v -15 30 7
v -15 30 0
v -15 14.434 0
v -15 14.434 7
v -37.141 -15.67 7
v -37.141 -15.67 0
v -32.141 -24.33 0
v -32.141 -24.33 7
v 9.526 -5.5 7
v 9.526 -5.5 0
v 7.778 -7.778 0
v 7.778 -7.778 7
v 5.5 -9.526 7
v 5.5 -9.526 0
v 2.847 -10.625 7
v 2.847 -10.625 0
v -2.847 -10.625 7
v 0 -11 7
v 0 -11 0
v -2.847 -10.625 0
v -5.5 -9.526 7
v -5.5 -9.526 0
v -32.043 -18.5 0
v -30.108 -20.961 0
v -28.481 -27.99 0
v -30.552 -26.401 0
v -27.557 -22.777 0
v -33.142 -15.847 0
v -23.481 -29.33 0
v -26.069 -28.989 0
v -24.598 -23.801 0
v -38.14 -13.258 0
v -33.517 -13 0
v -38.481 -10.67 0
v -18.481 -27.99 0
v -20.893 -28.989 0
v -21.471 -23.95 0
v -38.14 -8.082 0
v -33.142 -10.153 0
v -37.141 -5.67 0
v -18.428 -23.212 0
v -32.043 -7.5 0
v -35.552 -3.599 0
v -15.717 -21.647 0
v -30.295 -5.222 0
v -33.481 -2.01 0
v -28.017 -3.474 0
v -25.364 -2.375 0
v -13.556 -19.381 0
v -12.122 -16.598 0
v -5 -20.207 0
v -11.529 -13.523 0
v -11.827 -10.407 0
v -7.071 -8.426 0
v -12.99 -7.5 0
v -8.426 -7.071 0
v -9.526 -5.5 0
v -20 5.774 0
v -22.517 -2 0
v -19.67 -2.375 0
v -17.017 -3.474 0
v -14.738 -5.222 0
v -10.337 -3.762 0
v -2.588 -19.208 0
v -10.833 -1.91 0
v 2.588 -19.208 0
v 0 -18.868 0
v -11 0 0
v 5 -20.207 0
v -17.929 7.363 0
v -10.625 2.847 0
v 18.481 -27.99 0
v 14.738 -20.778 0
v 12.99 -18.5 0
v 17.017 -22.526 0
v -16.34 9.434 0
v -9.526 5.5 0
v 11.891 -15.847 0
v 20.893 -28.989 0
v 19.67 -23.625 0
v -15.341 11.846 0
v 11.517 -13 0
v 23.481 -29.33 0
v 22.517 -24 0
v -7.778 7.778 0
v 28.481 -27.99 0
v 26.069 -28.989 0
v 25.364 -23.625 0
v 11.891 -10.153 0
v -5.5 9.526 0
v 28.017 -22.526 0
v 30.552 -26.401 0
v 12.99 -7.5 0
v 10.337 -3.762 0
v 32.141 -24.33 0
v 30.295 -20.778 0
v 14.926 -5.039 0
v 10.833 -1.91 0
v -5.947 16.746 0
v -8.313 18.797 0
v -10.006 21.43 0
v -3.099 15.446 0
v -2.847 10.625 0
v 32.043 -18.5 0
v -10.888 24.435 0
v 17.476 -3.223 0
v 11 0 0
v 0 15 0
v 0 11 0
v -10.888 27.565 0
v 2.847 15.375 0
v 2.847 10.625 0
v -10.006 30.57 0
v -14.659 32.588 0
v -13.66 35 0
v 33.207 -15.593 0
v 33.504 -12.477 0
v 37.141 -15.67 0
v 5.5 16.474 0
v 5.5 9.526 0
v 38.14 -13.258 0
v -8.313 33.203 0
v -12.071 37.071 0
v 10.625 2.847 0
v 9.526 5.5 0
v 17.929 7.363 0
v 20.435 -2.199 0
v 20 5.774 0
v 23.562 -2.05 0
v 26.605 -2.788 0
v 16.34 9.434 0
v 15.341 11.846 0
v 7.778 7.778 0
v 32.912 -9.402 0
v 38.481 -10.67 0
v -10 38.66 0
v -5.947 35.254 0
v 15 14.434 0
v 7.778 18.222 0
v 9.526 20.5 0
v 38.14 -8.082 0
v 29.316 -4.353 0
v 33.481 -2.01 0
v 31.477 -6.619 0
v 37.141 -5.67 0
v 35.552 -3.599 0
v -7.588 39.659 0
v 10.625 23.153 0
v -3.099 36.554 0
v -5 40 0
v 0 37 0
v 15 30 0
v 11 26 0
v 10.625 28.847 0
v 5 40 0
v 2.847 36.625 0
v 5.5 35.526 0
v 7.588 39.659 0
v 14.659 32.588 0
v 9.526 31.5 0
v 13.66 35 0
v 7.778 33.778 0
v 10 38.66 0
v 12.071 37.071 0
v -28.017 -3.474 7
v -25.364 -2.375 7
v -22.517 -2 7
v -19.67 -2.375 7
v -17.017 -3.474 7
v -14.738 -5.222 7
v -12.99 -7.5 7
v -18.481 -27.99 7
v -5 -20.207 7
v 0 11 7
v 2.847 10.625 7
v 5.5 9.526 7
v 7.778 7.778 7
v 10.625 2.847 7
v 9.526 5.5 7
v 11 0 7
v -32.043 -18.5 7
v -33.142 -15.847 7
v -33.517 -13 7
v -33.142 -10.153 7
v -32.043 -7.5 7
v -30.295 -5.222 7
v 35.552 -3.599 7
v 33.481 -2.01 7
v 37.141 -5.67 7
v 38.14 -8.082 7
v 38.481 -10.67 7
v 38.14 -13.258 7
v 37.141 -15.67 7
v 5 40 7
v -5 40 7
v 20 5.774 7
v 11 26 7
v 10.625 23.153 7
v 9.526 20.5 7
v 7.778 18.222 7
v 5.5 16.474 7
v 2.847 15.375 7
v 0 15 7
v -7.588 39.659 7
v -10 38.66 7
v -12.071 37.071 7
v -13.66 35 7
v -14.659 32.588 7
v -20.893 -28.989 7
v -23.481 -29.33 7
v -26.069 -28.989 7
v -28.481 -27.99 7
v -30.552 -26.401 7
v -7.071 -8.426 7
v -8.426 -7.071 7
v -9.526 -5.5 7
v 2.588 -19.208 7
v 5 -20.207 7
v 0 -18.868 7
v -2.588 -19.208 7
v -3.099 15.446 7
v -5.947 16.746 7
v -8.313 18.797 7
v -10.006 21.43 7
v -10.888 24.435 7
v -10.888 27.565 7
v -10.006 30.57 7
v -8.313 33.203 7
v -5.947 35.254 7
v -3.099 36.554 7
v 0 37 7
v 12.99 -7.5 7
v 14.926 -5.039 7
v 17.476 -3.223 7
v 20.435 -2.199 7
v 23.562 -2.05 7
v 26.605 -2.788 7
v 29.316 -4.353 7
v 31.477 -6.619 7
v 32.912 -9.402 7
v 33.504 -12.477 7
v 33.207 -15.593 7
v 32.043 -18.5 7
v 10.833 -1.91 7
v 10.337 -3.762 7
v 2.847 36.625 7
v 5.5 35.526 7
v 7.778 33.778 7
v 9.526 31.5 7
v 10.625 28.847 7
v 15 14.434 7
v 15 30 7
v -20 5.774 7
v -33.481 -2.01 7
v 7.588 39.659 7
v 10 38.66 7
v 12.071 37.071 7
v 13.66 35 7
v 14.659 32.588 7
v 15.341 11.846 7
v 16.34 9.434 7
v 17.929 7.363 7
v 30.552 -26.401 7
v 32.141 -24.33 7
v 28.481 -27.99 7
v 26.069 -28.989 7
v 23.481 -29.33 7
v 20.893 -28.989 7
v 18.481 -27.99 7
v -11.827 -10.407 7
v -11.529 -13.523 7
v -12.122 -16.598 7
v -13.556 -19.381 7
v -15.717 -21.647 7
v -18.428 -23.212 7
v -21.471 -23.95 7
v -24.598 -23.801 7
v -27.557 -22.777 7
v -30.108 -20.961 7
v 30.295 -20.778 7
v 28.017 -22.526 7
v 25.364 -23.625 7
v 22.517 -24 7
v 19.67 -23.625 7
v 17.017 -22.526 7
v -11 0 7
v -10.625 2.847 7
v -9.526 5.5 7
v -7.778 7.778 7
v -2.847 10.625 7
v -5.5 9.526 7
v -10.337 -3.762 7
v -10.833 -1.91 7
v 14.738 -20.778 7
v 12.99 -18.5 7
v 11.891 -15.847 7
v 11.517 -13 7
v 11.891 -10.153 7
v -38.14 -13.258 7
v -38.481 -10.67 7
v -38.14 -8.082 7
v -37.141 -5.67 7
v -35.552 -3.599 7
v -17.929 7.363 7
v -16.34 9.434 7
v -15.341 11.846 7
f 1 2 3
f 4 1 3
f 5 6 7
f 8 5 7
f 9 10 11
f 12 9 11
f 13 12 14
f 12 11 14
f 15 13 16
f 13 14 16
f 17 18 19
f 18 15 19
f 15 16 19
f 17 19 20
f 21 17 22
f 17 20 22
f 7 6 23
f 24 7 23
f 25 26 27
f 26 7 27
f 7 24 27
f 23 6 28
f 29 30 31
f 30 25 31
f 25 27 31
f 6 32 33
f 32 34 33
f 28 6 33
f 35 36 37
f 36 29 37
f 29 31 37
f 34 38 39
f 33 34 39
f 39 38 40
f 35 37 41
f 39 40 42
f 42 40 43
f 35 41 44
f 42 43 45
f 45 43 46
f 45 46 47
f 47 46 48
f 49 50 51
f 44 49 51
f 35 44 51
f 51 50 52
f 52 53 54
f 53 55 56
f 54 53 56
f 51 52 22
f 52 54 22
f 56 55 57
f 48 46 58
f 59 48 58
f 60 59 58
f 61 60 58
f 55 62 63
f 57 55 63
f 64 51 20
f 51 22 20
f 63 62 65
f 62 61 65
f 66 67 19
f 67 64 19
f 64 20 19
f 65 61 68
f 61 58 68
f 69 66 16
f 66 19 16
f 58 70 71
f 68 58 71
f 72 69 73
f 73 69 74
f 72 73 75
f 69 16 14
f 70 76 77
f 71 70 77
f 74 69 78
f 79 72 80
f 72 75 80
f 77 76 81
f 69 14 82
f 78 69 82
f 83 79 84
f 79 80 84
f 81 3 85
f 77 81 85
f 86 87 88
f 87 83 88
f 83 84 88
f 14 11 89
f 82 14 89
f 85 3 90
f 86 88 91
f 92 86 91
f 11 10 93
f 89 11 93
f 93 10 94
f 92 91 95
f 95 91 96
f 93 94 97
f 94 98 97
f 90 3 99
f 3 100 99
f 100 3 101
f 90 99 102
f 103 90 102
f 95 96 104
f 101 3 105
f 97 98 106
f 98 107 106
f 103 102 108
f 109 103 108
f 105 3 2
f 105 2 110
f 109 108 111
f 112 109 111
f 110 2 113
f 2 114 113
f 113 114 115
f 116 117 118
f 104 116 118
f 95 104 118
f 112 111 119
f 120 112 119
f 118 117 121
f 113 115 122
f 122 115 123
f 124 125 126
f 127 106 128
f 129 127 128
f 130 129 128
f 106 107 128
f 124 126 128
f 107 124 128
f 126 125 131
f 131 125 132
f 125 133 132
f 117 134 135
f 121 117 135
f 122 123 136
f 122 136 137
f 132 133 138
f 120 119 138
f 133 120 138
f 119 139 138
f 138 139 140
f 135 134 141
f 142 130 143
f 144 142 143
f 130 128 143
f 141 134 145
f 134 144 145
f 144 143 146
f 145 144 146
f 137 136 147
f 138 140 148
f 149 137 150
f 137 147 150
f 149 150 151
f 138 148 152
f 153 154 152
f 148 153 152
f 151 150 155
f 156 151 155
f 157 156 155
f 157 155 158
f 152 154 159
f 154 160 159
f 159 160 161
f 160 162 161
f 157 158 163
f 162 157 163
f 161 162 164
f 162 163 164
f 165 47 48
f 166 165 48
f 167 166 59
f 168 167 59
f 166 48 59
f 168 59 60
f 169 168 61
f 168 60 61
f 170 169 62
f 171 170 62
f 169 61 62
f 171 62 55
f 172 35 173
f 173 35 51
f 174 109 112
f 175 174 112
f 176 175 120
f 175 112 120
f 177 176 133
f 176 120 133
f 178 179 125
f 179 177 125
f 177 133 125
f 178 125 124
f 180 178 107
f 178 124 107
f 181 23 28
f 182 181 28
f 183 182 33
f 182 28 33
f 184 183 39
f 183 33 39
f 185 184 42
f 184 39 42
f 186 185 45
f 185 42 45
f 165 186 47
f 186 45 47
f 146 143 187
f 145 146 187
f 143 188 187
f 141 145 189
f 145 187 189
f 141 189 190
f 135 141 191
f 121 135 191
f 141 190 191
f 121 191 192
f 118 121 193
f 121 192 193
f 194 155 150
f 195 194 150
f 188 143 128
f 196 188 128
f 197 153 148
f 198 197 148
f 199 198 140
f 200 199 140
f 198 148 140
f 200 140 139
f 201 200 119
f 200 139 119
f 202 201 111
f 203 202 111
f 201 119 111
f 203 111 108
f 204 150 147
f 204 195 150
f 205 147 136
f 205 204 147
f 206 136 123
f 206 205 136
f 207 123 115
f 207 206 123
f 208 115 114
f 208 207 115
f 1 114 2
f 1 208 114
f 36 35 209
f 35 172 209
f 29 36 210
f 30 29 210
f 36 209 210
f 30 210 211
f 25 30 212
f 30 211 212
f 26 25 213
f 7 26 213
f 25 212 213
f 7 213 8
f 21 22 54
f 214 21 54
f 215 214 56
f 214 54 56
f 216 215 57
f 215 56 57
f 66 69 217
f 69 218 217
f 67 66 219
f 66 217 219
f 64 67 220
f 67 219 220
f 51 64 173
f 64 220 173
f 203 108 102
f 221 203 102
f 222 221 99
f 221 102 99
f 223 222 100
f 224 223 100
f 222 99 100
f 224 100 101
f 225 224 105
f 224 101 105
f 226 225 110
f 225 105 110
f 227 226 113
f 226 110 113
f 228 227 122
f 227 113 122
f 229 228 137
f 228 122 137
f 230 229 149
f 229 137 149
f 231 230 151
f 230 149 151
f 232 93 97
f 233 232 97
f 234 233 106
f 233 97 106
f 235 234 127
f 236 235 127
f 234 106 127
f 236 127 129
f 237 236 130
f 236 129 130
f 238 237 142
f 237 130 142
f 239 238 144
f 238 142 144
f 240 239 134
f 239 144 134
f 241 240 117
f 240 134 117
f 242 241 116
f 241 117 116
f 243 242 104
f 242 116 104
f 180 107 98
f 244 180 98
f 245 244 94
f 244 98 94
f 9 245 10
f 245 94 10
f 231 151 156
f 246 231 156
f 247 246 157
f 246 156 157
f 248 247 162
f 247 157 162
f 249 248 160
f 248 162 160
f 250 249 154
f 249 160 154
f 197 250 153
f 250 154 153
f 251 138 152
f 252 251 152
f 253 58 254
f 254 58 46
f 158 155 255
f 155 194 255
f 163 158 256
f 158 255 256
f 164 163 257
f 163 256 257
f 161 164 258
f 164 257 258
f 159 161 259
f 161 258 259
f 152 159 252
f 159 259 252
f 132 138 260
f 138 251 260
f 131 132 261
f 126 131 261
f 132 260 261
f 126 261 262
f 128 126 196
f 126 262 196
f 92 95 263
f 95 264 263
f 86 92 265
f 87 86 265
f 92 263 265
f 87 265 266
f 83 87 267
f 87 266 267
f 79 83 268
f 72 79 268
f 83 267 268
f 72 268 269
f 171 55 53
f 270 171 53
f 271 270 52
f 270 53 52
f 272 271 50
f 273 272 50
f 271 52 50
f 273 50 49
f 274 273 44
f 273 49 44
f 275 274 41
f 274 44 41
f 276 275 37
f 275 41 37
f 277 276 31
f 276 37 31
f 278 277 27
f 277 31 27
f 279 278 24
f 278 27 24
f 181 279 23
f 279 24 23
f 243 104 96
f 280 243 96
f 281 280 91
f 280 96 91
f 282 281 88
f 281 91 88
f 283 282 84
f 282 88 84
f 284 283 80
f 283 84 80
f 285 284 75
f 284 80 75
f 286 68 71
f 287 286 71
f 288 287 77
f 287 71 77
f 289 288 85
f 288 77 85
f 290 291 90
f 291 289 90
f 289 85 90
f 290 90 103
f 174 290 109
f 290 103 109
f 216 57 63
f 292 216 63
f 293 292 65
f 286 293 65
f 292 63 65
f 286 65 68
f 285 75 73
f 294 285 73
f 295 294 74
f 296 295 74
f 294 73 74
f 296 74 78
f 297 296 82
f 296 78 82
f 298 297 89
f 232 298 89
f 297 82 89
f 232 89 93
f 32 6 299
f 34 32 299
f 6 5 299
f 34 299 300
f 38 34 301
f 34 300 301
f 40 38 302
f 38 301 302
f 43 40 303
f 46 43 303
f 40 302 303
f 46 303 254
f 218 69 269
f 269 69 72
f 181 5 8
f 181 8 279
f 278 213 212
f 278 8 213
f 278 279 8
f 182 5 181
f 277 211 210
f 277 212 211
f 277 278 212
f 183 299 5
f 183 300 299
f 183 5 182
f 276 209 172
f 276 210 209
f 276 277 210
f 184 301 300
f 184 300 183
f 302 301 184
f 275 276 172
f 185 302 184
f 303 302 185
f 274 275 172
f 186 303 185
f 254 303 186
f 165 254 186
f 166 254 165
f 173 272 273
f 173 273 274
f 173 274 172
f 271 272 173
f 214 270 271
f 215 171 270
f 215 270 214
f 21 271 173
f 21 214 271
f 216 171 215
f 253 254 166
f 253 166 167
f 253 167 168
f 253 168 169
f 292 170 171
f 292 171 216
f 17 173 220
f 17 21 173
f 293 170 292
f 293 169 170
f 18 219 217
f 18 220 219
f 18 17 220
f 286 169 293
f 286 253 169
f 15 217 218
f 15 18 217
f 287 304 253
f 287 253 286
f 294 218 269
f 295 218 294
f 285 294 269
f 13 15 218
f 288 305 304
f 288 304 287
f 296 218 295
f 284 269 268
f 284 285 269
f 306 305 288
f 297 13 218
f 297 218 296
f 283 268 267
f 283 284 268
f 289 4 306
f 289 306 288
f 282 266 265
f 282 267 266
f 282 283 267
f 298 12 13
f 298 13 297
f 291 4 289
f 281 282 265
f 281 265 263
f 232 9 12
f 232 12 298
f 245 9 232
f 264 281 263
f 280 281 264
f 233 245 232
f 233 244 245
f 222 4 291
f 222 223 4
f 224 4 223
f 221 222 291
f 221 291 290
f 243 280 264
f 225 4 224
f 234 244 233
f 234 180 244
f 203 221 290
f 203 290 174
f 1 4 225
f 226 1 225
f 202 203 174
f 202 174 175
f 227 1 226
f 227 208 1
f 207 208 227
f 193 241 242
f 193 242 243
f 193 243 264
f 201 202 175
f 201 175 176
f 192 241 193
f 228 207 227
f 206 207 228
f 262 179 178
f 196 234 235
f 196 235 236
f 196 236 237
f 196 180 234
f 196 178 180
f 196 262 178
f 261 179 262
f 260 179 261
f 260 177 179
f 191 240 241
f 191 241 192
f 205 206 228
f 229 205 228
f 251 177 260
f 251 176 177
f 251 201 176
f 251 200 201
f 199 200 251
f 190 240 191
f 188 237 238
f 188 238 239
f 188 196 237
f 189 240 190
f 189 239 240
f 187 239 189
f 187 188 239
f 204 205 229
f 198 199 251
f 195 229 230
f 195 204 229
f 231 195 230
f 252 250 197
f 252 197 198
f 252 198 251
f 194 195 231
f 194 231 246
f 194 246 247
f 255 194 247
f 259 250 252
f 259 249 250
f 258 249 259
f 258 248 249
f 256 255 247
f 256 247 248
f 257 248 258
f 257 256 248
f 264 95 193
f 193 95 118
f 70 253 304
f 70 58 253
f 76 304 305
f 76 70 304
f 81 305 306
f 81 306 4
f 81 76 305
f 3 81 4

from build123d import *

# Parameters (mm, degrees)
F1_DEPTH = 7
F3_ANGLE = 120
F4_ANGLE = 240
F6_R     = 10


with BuildPart() as f1:
    # F0 (on Top) → F1 (new body)
    with BuildSketch(Plane.XY):
        with BuildLine():
            ThreePointArc((-11, 0), (-7.7781745931, 7.7781745931), (0, 11))
            Line((0, 11), (0, 15))
            ThreePointArc((0, 15), (-11, 26), (0, 37))
            Line((0, 37), (0, 40))
            Line((0, 40), (-15, 40))
            Line((-15, 40), (-15, 0))
            Line((-15, 0), (-11, 0))
        make_face()
        with BuildLine():
            ThreePointArc((0, 11), (7.7781745931, 7.7781745931), (11, 0))
            Line((11, 0), (15, 0))
            Line((15, 0), (15, 40))
            Line((15, 40), (0, 40))
            Line((0, 40), (0, 37))
            ThreePointArc((0, 37), (7.7781745931, 33.7781745931), (11, 26))
            ThreePointArc((11, 26), (7.7781745931, 18.2218254069), (0, 15))
            Line((0, 15), (0, 11))
        make_face()
    extrude(amount=F1_DEPTH)


with BuildPart() as f3_1:
    # F3: copy of F1
    add(f1.part.rotate(Axis((0, 0, 26.0697361082), (0, 0, 1)), F3_ANGLE))


with BuildPart() as f4_1:
    # F4: copy of F1
    add(f1.part.rotate(Axis((0, 0, 26.0697361082), (0, 0, 1)), F4_ANGLE))


with BuildPart() as f1_1:
    add(f1.part)

    # F5: union F4_1, F3_1
    add(f4_1.part)
    add(f3_1.part)

    # F6
    f6_edges = [f1_1.edges().sort_by_distance(p)[0] for p in [
        (15, 40, 3.5),
        (42.141016, -7.009619, 3.5),
        (27.141016, -32.990381, 3.5),
        (-27.141016, -32.990381, 3.5),
        (-42.141016, -7.009619, 3.5),
        (-15, 40, 3.5),
        (-15, 8.660254, 3.5),
        (0, -17.320508, 3.5),
        (15, 8.660254, 3.5),
    ]]
    fillet(f6_edges, radius=F6_R)


solid = f1_1.part
